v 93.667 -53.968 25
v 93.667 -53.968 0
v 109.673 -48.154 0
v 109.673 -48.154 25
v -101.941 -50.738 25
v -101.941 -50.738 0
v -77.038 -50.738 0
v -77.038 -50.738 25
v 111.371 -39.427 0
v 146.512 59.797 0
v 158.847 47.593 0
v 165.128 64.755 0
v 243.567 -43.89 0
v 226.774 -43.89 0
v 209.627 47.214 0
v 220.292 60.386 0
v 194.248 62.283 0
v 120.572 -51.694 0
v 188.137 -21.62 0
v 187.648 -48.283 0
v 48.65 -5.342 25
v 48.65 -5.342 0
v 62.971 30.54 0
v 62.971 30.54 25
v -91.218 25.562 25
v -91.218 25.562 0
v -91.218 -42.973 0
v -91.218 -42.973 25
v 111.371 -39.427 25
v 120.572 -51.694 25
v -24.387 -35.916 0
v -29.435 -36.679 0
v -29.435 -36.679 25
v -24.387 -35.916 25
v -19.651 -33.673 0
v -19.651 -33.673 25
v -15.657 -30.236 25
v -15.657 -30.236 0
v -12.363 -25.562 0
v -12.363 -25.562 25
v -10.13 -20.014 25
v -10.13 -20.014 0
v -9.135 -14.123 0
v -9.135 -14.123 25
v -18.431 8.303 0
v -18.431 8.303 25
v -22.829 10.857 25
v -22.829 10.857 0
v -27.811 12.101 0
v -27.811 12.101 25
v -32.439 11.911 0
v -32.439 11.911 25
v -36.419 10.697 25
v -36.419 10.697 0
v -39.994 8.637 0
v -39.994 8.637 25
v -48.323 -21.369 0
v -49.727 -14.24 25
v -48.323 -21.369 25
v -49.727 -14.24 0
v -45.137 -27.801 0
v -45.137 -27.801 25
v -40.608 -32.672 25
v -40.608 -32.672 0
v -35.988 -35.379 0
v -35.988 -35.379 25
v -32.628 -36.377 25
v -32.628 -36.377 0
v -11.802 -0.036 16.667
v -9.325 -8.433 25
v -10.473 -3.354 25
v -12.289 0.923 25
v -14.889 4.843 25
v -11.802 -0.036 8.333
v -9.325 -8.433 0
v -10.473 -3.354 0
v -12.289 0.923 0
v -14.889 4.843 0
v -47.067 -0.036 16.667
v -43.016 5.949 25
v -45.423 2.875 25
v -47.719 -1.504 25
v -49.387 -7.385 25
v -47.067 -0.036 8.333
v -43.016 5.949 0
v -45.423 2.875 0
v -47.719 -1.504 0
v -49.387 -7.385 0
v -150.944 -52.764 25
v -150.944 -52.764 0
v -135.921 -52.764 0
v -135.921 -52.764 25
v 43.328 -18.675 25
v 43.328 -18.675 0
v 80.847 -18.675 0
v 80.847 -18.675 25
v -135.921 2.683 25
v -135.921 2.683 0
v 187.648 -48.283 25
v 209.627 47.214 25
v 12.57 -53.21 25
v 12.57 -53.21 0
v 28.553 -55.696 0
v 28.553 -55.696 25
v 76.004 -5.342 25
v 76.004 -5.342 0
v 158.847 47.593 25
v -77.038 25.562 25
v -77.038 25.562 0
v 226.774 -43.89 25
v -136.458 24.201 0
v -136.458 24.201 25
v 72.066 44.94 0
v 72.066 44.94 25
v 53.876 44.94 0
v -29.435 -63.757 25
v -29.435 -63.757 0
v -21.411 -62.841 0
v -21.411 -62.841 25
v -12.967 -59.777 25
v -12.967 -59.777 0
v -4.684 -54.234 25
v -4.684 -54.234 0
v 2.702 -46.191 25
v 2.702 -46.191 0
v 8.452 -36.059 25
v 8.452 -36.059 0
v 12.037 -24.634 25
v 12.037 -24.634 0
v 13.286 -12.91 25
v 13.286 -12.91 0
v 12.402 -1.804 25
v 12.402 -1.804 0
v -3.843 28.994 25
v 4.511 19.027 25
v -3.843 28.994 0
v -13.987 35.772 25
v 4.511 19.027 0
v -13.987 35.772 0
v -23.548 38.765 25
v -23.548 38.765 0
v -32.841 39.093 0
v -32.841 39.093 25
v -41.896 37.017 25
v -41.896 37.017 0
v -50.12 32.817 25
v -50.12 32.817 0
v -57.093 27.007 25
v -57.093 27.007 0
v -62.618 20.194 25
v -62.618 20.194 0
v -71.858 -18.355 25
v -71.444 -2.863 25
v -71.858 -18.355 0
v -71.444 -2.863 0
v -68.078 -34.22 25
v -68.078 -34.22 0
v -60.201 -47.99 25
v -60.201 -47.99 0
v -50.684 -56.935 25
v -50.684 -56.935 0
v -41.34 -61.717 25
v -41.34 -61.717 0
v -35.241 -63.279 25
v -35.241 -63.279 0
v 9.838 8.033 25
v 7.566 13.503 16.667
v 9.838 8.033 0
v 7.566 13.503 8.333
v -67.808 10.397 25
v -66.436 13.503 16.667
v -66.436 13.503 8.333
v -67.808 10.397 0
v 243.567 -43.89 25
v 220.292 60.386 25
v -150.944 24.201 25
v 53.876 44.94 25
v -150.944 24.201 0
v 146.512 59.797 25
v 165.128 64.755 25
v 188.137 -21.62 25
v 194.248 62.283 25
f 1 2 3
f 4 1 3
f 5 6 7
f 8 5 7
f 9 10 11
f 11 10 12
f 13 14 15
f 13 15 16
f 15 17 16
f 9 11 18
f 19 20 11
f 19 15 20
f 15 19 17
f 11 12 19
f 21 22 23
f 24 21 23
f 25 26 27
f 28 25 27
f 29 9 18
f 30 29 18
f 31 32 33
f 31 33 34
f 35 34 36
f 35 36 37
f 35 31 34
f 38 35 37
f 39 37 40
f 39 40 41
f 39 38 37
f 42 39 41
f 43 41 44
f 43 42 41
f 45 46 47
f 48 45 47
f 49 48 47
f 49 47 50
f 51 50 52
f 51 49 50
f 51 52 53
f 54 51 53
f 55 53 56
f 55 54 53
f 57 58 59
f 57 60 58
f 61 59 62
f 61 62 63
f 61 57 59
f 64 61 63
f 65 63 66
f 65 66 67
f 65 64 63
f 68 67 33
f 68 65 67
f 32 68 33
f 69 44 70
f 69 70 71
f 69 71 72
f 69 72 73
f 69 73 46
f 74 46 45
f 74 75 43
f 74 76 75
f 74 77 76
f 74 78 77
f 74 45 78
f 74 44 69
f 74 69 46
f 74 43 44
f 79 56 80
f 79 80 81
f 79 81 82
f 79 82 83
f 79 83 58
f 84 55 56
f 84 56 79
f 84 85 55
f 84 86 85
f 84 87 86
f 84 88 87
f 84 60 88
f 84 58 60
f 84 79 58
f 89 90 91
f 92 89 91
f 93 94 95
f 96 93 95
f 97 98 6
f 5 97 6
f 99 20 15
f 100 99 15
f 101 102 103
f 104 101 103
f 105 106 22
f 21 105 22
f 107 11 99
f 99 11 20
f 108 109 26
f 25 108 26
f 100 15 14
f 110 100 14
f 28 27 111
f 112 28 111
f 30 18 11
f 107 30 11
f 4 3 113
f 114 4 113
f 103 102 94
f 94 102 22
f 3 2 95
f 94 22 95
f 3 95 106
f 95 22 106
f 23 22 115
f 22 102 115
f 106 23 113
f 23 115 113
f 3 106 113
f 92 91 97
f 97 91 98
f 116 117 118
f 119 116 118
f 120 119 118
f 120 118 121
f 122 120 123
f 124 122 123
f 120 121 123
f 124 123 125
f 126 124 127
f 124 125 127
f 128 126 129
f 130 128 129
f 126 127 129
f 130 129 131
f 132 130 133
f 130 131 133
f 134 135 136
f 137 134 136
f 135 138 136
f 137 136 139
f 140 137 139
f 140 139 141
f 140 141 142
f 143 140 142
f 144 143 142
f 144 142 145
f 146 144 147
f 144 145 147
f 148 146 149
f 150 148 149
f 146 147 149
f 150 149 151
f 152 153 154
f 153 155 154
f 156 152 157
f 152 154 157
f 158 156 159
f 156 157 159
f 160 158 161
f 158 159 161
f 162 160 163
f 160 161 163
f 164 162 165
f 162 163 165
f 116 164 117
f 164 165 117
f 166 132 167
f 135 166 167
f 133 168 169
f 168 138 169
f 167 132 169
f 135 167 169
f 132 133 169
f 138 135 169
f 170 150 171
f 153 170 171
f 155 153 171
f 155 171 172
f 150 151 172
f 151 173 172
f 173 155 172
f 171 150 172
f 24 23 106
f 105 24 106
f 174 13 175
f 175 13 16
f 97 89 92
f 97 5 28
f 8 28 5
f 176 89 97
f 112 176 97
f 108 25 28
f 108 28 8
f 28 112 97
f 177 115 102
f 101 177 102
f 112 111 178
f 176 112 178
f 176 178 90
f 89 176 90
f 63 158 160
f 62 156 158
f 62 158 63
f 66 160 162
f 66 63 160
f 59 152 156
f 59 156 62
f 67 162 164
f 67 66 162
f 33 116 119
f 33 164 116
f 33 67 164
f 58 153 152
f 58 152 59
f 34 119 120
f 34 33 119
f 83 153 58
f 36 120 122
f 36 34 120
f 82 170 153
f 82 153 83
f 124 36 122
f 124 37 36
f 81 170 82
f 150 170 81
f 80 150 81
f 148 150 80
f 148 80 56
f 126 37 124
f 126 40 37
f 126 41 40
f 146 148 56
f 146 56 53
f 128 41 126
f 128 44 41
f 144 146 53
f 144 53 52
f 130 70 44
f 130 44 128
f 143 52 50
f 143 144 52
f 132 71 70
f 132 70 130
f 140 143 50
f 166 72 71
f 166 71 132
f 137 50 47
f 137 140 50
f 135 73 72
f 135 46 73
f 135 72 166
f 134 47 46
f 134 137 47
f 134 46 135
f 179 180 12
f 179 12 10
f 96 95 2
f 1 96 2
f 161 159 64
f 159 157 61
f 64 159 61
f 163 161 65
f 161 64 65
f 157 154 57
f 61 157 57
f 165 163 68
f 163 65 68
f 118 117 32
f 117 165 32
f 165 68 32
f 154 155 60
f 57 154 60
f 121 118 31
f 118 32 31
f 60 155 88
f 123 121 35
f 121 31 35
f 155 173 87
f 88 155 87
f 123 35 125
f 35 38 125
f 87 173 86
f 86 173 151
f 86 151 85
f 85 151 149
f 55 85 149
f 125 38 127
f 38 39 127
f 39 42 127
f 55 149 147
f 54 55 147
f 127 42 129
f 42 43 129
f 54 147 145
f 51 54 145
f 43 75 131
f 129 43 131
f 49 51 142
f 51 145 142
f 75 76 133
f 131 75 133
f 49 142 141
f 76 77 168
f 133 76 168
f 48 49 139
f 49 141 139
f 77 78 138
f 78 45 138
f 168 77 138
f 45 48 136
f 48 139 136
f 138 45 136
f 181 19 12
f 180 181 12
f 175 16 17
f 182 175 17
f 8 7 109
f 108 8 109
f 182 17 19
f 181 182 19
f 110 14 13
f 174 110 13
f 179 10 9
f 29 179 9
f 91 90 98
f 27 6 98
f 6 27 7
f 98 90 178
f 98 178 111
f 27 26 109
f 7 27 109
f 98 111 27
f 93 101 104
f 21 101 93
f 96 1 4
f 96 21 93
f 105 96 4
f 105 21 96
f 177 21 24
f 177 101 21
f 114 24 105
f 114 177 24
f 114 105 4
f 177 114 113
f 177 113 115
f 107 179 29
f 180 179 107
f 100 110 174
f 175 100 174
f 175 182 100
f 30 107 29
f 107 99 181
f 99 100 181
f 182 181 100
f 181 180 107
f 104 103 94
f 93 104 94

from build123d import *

# Parameters (mm, degrees)
F1_DEPTH = 25


with BuildPart() as f1:
    # F0 (on Top) → F1 (new body)
    with BuildSketch(Plane.XY):
        with BuildLine():
            add(Edge.make_bspline(
                [(-29.434795, -63.757111), (44.566638, -63.757111), (7.565922, 13.503275), (-29.434795, 90.763662), (-66.435511, 13.503275), (-103.436227, -63.757111), (-29.434795, -63.757111)],
                knots=[0, 0, 0, 2.094395, 2.094395, 4.18879, 4.18879, 6.283185, 6.283185, 6.283185], degree=2, weights=[1, 0.5, 1, 0.5, 1, 0.5, 1]))
        make_face()
        with BuildLine():
            add(Edge.make_bspline(
                [(-29.434795, -36.679001), (5.82996, -36.679001), (-11.802417, -0.03578), (-29.434795, 36.607441), (-47.067172, -0.03578), (-64.699549, -36.679001), (-29.434795, -36.679001)],
                knots=[0, 0, 0, 2.094395, 2.094395, 4.18879, 4.18879, 6.283185, 6.283185, 6.283185], degree=2, weights=[1, 0.5, 1, 0.5, 1, 0.5, 1]))
        make_face(mode=Mode.SUBTRACT)
        Polygon((-91.217712, -42.97284), (-136.457667, 24.201287), (-150.943905, 24.201287), (-150.943905, -52.763574), (-135.921061, -52.763574), (-135.921061, 2.682654), (-101.940796, -50.737903), (-77.038027, -50.737903), (-77.038027, 25.562307), (-91.217712, 25.562307), align=None)
        Polygon((48.650134, -5.341723), (62.97116, 30.53952), (76.004256, -5.341723), (80.847336, -18.675143), (93.666606, -53.967703), (109.673289, -48.153617), (72.066106, 44.939853), (53.876206, 44.939853), (12.569981, -53.209793), (28.552599, -55.695975), (43.328461, -18.675143), align=None)
        Polygon((76.004256, -5.341723), (48.650134, -5.341723), (43.328461, -18.675143), (80.847336, -18.675143), align=None)
        Polygon((111.371249, -39.42702), (120.572492, -51.693965), (158.847049, 47.592547), (187.64773, -48.283365), (209.627181, 47.213592), (226.774365, -43.889947), (243.567452, -43.889947), (220.292374, 60.385879), (194.248363, 62.282998), (188.136627, -21.620088), (165.128231, 64.755335), (146.512469, 59.796531), align=None)
    extrude(amount=F1_DEPTH)


solid = f1.part
